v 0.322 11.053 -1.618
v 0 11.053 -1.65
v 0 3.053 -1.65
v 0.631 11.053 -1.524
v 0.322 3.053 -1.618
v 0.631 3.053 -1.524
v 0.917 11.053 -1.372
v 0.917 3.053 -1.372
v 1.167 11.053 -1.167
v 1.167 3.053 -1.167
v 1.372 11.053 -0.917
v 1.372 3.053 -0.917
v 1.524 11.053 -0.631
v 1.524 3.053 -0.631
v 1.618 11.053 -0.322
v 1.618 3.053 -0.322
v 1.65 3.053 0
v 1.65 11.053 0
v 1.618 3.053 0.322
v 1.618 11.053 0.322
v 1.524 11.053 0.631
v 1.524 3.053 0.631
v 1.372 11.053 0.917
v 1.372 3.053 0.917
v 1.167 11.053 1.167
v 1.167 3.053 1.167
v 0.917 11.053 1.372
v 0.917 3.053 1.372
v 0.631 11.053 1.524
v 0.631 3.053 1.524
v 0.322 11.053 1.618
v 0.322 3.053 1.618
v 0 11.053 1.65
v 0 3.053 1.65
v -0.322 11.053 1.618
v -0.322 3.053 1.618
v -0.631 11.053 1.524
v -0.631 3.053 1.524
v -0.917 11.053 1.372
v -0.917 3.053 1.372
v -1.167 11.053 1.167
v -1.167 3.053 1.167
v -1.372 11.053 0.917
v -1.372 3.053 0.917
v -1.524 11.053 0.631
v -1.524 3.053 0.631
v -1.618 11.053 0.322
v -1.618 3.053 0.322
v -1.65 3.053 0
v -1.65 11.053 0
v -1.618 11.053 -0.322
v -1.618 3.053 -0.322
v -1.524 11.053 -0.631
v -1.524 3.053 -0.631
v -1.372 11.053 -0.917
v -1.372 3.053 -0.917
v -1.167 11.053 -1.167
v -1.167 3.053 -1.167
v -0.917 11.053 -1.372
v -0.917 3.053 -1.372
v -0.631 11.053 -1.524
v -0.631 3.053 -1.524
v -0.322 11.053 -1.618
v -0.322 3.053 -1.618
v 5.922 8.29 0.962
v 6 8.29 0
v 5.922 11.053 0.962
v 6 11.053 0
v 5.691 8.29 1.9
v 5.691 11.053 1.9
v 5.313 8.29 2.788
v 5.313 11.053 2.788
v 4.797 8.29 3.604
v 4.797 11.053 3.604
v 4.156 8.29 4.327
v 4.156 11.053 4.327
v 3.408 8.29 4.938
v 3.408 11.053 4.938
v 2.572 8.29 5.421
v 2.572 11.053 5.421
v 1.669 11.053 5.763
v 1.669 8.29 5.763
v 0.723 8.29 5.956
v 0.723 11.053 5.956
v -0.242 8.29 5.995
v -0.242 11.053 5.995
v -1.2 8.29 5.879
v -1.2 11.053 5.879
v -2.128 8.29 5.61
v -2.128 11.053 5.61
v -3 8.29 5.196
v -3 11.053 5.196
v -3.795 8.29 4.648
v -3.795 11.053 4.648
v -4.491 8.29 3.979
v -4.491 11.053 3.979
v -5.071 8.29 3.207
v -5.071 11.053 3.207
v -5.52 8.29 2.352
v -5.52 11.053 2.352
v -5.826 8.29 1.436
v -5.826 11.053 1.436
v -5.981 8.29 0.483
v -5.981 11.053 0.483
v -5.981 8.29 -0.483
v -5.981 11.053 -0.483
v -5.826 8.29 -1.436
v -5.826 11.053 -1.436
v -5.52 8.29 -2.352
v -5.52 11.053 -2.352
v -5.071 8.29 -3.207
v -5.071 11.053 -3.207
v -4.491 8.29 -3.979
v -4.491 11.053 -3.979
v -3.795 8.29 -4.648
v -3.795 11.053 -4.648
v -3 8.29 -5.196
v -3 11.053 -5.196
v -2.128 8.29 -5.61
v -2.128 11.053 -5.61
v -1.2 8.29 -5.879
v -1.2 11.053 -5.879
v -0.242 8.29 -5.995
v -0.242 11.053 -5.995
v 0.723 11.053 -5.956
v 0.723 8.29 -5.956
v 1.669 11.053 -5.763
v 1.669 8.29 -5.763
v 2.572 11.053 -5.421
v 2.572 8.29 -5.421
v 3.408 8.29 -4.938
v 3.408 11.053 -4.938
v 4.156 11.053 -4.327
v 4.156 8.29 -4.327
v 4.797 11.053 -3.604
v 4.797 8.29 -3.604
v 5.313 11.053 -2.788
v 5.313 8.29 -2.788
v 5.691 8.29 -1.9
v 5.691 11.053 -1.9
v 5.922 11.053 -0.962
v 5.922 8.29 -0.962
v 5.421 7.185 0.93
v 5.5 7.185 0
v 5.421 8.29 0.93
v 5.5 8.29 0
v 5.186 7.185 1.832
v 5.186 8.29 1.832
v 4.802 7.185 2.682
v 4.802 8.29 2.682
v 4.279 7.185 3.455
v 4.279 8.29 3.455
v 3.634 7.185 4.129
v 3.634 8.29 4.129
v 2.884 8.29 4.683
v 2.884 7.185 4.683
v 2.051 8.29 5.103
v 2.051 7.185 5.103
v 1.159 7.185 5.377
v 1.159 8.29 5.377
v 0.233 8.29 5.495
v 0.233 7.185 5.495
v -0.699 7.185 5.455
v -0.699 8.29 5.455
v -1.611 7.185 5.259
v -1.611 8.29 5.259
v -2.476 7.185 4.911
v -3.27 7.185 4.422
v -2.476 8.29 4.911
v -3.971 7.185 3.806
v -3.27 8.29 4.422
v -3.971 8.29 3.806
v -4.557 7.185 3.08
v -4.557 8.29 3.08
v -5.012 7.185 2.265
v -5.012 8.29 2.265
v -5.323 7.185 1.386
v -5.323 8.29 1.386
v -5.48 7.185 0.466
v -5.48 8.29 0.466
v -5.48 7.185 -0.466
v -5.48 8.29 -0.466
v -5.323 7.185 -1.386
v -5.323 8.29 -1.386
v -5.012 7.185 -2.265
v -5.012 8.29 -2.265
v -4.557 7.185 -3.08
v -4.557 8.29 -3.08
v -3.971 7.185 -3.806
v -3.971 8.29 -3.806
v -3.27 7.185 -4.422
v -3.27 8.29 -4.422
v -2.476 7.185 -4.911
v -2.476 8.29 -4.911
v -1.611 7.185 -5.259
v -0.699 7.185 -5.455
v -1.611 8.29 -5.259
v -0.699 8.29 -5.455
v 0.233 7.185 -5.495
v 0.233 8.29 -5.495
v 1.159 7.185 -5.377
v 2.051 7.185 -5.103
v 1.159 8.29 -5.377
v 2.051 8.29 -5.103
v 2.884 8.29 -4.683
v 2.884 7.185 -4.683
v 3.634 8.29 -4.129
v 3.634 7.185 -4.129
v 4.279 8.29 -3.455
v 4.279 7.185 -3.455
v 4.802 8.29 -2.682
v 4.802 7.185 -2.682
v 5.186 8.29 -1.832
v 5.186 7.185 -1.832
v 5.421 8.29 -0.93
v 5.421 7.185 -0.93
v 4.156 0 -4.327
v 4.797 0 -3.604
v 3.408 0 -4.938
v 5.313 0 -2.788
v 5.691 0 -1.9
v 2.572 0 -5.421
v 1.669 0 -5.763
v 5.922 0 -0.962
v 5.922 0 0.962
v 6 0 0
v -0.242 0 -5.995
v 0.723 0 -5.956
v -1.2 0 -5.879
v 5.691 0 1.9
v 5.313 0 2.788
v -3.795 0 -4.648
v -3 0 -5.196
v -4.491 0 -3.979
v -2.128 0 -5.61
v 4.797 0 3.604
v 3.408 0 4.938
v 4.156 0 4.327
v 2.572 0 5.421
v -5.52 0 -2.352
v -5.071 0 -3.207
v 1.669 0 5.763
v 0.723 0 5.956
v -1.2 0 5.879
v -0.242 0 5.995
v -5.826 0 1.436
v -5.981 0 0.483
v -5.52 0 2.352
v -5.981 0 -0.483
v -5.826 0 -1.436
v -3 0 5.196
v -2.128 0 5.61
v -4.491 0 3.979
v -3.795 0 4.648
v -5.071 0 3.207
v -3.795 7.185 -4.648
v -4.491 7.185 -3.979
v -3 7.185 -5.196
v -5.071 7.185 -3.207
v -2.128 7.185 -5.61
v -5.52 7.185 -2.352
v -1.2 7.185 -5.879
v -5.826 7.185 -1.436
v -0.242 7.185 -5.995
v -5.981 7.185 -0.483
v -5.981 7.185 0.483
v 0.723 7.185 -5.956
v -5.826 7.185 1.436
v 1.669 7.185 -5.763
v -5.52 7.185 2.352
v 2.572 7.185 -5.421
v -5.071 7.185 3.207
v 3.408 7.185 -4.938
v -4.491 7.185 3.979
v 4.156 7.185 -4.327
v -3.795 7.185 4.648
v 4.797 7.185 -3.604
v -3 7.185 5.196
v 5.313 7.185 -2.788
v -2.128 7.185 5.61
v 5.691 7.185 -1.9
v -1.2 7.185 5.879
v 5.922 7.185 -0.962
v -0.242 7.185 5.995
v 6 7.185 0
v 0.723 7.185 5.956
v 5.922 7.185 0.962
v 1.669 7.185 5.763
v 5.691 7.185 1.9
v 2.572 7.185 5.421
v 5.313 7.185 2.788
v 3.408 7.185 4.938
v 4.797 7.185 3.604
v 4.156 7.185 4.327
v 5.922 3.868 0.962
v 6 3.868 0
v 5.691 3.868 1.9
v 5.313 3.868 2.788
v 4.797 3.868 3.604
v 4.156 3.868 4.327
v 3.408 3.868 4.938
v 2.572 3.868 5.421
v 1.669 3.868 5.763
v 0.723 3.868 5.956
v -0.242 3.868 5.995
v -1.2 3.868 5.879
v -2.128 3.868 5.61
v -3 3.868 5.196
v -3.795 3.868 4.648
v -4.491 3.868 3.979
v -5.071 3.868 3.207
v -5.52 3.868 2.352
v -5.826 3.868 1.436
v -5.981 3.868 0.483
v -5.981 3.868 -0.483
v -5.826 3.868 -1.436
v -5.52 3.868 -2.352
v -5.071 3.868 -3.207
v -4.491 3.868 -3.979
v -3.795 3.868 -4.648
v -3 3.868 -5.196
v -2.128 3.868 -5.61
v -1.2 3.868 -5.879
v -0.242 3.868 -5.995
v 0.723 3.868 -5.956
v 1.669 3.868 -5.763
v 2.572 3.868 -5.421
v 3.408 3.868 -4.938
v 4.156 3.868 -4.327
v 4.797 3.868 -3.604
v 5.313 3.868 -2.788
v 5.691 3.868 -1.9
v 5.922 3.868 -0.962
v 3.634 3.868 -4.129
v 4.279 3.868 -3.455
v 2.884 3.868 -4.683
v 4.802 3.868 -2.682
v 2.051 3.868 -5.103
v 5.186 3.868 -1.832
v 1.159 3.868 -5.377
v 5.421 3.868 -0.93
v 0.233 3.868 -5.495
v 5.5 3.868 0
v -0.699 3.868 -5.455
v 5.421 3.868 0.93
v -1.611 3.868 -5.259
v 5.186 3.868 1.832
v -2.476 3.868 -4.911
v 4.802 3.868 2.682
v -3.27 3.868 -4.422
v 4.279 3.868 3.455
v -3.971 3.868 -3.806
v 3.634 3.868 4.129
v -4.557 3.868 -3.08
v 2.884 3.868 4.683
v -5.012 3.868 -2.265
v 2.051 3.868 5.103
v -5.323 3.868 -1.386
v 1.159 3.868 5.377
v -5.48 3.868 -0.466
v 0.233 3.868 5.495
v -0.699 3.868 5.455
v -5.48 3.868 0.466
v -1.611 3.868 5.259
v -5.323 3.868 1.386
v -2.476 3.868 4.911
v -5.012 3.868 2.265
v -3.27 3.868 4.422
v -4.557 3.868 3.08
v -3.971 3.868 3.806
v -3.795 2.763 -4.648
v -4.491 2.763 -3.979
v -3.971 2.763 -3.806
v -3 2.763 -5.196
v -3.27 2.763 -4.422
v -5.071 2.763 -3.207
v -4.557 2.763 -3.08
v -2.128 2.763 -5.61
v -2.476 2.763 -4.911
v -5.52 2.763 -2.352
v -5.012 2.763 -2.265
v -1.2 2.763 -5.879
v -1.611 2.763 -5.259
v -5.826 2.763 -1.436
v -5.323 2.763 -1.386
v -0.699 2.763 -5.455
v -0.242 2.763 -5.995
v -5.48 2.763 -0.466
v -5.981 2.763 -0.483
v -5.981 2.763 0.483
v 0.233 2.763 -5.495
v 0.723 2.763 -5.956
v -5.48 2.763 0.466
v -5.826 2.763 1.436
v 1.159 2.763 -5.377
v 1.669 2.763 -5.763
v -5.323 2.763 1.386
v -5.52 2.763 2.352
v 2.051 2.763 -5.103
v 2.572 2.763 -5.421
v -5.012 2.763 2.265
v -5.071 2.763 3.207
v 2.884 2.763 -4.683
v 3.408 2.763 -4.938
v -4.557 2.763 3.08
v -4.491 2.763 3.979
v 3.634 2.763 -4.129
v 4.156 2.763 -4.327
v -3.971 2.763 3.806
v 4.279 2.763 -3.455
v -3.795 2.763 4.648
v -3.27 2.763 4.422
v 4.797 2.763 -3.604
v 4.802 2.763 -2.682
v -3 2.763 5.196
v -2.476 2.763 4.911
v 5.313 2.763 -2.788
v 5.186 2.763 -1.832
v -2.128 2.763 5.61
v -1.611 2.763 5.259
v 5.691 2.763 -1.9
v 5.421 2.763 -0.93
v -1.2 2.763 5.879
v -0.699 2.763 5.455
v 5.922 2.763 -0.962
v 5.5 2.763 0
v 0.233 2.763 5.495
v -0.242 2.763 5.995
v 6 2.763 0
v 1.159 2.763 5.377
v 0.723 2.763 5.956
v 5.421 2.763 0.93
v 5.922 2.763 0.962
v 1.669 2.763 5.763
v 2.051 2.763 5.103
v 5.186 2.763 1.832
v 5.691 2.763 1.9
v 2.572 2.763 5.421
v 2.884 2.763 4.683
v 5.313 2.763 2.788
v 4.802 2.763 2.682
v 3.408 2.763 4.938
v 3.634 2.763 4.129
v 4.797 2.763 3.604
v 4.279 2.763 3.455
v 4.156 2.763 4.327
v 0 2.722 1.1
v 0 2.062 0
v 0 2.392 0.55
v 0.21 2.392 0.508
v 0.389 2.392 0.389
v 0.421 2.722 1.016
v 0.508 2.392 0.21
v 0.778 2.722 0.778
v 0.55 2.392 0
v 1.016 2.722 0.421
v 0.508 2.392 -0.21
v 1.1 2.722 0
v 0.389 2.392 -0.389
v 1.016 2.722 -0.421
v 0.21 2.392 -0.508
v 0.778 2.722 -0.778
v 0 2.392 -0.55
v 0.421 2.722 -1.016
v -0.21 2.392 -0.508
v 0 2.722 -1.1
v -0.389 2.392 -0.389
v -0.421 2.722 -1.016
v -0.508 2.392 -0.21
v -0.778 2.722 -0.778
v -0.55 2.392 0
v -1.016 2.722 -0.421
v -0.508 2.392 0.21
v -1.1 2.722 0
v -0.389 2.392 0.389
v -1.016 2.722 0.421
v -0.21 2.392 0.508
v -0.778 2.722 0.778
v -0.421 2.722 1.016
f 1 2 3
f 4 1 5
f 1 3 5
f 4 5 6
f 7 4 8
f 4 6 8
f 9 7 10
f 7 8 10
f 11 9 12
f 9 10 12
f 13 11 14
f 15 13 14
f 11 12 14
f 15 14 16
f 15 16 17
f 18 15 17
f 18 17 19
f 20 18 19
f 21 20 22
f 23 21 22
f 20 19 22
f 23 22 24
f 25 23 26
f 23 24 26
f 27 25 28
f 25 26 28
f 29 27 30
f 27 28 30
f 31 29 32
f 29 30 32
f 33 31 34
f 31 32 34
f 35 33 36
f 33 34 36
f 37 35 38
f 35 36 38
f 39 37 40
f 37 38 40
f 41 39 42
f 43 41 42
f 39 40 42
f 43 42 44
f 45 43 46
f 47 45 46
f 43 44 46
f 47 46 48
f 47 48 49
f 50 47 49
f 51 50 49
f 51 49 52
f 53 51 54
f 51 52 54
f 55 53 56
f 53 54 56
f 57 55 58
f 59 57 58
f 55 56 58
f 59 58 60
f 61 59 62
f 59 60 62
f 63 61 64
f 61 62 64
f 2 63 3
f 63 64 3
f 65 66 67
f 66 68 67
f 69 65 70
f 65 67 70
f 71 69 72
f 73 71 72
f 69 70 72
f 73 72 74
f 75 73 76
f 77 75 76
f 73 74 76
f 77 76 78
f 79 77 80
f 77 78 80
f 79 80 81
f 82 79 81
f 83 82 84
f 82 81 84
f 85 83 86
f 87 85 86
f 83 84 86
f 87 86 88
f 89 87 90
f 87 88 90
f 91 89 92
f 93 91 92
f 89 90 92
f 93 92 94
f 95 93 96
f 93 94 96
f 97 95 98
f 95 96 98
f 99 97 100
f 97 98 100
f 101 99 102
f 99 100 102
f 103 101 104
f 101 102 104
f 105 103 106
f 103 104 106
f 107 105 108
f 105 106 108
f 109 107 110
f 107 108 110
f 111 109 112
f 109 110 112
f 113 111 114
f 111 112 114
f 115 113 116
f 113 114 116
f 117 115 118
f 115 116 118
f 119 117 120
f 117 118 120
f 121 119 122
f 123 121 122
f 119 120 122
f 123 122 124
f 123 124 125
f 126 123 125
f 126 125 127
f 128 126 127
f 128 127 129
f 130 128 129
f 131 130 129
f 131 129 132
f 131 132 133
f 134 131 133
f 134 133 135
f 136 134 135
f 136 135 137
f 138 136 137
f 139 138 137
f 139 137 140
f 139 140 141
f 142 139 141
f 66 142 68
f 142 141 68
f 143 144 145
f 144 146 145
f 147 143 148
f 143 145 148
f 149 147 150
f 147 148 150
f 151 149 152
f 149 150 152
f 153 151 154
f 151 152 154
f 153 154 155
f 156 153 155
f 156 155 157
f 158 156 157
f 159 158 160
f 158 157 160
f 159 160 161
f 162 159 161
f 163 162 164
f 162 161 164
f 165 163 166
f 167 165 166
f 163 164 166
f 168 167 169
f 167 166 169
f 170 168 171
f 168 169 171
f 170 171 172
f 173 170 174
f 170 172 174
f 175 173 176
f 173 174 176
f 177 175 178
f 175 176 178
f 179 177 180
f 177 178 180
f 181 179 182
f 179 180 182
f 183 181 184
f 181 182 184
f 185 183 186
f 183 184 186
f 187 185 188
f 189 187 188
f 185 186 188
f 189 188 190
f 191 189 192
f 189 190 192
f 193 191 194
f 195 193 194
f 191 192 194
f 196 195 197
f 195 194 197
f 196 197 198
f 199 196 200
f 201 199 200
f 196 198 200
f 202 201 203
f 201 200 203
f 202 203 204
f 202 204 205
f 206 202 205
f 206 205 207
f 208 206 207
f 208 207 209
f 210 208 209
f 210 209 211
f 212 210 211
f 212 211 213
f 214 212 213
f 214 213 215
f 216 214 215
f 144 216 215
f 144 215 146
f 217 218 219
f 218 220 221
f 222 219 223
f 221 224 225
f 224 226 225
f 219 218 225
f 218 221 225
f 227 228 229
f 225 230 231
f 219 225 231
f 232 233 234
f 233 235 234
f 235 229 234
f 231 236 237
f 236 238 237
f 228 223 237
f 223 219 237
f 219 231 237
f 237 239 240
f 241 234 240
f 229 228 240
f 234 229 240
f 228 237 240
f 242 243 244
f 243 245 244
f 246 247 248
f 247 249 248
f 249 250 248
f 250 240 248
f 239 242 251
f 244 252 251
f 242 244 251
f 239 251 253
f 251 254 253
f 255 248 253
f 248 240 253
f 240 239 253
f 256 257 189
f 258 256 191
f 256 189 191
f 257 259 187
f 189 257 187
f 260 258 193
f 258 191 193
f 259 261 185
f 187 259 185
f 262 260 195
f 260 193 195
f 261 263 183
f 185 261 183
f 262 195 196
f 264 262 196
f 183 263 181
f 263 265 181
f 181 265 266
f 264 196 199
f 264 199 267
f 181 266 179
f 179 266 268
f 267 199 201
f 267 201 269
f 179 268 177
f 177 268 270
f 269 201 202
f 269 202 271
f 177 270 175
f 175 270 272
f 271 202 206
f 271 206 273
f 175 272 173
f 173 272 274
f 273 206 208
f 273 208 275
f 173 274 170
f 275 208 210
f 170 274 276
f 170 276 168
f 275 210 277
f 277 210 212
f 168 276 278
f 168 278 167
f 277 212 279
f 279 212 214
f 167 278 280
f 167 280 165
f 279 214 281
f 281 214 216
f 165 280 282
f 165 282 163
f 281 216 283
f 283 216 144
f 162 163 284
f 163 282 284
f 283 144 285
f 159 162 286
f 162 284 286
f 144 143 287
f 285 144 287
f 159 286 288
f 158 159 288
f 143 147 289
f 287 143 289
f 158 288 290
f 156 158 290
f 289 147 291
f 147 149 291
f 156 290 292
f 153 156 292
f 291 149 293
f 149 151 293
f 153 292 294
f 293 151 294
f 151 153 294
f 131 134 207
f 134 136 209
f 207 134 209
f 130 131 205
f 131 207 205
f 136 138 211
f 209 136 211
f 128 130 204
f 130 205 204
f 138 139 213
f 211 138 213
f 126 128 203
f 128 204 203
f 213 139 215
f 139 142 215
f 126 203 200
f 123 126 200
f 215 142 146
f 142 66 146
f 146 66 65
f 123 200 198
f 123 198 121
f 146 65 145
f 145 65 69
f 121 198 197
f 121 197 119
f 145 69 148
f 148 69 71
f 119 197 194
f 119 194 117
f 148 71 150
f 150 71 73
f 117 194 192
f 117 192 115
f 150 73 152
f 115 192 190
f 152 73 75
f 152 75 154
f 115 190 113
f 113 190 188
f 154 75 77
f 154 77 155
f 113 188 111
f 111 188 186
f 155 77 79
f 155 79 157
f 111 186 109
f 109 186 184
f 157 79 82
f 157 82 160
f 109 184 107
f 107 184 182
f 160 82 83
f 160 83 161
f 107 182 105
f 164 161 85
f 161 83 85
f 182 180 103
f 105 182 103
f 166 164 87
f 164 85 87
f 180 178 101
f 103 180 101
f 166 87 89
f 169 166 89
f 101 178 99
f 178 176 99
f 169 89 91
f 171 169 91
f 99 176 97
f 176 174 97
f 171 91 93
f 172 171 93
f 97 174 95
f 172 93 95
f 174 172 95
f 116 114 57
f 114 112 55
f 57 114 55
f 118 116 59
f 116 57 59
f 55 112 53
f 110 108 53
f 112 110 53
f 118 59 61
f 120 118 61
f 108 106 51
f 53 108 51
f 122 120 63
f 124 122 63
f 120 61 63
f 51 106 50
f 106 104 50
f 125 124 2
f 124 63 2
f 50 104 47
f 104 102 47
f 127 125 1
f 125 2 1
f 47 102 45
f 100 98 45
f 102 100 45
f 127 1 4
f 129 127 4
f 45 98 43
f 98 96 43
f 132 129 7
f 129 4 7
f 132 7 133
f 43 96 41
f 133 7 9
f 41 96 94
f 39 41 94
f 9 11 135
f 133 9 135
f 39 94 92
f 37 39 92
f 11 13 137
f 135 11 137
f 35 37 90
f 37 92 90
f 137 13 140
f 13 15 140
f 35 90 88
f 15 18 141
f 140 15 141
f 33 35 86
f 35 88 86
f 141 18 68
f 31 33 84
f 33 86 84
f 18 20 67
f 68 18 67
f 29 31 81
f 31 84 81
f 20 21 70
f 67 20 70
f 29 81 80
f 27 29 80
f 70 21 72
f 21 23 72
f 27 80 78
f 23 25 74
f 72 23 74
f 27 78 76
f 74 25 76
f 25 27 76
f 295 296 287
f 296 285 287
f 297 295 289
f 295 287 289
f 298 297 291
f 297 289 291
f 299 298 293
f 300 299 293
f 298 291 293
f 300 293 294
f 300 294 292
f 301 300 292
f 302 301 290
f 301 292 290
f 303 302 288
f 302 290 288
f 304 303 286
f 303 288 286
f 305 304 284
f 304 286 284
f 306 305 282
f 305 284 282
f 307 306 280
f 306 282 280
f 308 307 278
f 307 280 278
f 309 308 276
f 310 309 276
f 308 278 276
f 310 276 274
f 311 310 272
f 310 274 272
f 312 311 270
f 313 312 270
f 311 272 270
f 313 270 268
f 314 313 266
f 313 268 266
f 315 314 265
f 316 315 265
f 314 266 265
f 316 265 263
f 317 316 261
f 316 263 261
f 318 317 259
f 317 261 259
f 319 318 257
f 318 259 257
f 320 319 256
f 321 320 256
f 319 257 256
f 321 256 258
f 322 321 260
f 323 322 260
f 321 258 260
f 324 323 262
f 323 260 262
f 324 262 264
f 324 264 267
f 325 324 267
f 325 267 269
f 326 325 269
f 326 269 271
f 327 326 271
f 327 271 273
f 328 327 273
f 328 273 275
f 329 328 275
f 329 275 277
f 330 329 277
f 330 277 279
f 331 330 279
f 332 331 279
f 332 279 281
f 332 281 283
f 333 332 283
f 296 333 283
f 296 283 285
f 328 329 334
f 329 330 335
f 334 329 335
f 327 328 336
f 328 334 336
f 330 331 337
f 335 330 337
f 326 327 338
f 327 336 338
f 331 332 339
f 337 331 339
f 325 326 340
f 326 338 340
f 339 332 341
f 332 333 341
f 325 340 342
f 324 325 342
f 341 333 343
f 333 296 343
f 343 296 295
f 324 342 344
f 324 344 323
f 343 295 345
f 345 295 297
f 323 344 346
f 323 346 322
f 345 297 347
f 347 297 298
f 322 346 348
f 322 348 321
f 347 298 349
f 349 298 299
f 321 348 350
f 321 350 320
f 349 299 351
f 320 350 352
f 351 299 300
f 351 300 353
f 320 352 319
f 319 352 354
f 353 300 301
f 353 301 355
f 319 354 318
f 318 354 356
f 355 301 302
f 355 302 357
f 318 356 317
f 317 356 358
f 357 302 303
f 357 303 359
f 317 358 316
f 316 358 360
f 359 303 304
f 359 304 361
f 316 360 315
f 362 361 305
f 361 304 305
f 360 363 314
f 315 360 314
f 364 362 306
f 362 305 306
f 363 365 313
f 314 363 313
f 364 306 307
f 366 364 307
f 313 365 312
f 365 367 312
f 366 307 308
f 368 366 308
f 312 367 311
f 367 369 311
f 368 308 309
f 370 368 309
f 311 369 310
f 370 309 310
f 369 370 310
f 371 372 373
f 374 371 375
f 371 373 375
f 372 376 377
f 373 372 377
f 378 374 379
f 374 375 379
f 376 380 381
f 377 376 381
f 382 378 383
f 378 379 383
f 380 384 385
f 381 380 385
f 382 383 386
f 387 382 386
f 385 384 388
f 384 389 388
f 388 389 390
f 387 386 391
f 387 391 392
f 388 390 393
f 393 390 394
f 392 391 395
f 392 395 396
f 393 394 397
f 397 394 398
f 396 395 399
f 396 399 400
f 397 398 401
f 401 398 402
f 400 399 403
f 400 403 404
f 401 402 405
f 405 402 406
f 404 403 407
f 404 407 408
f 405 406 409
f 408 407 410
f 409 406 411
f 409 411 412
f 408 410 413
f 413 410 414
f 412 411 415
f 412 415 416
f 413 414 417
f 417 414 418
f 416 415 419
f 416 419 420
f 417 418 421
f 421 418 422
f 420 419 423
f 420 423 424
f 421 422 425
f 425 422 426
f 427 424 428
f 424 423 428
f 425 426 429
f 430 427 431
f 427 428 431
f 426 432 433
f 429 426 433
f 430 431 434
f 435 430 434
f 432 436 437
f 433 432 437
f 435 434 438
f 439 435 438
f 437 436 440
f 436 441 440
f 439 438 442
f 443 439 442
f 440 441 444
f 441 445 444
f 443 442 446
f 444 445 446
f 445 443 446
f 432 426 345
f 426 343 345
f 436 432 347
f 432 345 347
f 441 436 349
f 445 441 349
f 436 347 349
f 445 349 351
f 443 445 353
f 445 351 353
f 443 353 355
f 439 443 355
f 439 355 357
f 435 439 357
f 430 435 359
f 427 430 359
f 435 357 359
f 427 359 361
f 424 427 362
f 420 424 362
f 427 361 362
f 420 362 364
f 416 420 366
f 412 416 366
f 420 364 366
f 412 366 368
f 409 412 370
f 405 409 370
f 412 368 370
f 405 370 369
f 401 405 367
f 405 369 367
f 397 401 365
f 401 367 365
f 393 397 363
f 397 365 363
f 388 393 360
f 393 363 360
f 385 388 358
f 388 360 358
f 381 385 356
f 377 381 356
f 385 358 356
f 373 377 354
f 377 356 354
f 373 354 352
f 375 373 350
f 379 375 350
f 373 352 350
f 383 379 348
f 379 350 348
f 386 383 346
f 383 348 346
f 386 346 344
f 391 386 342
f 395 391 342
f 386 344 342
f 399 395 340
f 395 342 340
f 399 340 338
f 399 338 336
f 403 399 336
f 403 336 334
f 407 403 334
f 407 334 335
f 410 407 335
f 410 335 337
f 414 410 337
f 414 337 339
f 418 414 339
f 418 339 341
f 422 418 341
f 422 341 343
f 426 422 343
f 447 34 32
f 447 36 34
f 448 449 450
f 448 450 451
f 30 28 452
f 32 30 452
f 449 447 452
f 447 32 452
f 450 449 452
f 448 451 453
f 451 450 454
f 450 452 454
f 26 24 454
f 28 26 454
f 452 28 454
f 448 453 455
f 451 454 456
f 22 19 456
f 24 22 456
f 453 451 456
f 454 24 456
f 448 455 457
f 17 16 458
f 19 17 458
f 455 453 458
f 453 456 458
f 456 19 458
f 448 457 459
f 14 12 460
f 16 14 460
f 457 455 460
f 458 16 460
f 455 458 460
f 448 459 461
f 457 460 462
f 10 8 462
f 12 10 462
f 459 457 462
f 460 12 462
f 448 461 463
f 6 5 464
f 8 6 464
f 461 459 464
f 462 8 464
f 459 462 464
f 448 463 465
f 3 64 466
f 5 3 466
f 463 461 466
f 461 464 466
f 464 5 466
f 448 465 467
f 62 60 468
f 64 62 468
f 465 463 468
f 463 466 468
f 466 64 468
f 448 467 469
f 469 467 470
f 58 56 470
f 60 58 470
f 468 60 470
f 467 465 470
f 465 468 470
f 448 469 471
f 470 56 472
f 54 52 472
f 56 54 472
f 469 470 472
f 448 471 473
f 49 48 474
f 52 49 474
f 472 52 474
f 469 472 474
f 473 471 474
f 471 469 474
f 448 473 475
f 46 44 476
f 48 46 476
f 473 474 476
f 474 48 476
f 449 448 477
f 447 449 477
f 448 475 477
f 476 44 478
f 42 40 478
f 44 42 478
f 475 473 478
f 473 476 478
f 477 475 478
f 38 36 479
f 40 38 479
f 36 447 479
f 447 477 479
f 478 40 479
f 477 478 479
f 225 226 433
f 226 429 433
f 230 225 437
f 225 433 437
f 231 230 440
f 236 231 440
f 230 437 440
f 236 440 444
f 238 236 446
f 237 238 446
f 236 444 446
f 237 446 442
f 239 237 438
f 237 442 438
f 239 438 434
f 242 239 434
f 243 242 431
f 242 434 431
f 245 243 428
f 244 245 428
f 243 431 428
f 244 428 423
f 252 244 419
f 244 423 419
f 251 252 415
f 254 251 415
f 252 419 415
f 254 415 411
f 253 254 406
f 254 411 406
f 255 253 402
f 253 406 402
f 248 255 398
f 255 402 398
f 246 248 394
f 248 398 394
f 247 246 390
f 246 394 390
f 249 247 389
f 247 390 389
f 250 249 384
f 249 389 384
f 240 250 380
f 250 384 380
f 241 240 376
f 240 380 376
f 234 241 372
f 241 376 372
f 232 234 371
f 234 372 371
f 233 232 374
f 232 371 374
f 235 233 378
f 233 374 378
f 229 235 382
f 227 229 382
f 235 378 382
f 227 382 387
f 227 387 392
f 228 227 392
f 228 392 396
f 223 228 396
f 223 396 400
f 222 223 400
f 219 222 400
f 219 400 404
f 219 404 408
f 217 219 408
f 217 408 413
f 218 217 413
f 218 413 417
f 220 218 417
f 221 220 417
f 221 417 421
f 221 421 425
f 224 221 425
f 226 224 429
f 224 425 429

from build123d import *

# Parameters (mm, degrees)
M4X0_7_TAPPED_HOLE1_D     = 3.3
M4X0_7_TAPPED_HOLE1_DEPTH = 8
M4X0_7_TAPPED_HOLE1_TIP   = 0.991420021


with BuildPart() as part:
    # Sketch2 → Revolve1 (revolve)
    with BuildSketch(Plane.XY):
        Polygon((0, 0), (6, 0), (6, 2.762622939), (5.5, 2.762622939), (5.5, 3.867672115), (6, 3.867672115), (6, 7.185259401), (5.5, 7.185259401), (5.5, 8.290308577), (6, 8.290308577), (6, 11.052931516), (0, 11.052931516), align=None)
    revolve(axis=Axis((0, 48.827905014, 0), (0, -1, 0)))

    # M4x0.7 Tapped Hole1
    with Locations(Plane.ZX.offset(11.052931516)):
        with Locations((0, 0)):
            Hole(M4X0_7_TAPPED_HOLE1_D / 2, depth=M4X0_7_TAPPED_HOLE1_DEPTH)
            with Locations((0, 0, -(M4X0_7_TAPPED_HOLE1_DEPTH + M4X0_7_TAPPED_HOLE1_TIP / 2))):  # 118° drill point
                Cone(0, M4X0_7_TAPPED_HOLE1_D / 2, M4X0_7_TAPPED_HOLE1_TIP, mode=Mode.SUBTRACT)


solid = part.part
